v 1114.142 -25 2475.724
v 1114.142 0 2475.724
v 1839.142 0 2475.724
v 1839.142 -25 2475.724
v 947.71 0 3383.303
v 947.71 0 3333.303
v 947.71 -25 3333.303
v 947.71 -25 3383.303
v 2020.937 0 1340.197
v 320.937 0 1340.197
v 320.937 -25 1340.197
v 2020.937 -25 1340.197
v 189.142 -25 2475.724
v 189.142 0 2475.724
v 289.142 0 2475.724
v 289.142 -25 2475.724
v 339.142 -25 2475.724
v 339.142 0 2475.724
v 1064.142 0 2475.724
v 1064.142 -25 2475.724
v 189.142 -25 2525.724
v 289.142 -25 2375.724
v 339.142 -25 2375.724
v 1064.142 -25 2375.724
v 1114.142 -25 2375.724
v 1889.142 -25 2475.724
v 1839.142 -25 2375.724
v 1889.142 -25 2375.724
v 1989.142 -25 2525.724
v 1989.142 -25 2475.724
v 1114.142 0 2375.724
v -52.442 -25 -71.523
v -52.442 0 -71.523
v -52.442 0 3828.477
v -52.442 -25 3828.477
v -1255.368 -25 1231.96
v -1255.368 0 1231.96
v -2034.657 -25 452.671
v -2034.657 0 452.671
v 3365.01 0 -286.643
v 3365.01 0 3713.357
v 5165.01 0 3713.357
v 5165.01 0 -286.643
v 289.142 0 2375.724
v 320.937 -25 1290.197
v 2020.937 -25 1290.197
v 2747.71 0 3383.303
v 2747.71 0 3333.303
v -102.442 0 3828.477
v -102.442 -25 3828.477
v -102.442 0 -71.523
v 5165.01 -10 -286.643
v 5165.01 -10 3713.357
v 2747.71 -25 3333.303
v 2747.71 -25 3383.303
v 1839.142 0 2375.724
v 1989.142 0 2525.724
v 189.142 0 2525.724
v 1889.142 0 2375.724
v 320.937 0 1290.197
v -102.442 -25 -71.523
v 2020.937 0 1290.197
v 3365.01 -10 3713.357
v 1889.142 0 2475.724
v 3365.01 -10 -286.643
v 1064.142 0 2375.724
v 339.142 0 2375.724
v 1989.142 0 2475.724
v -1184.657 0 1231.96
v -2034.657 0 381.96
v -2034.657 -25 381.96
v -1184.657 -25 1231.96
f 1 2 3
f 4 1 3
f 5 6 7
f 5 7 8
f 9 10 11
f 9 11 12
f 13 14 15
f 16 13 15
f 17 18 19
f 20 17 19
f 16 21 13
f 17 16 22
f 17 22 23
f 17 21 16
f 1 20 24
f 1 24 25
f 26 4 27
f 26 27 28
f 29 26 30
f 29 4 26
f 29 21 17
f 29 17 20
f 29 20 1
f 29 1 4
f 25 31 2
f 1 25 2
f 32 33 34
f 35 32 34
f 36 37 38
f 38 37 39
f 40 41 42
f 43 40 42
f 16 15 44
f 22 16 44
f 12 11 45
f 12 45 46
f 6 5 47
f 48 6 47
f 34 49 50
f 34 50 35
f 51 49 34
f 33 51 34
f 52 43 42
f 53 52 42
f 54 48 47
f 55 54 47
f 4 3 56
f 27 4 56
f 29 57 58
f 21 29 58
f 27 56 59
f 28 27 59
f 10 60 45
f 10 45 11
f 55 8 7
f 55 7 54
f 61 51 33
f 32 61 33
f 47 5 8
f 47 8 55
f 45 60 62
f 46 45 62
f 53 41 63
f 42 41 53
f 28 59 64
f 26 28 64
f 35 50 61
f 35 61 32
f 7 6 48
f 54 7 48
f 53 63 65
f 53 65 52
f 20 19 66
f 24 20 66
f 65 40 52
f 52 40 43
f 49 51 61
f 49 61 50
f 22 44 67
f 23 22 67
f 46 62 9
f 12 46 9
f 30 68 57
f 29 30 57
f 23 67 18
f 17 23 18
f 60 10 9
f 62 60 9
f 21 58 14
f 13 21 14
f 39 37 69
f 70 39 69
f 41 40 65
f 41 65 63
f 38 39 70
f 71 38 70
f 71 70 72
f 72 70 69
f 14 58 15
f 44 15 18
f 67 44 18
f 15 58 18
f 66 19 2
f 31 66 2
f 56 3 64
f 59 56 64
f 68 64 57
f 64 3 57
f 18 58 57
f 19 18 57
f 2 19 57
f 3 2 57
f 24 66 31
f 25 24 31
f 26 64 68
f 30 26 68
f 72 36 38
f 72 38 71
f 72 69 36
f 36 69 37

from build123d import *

# Parameters (mm, degrees)
F0_W      = 50
F0_H      = 3900
F1_DEPTH  = 25
F2_W      = 1800
F2_H      = 50
F3_DEPTH  = 25
F5_DEPTH  = 25
F6_W      = 1700
F6_H      = 50
F7_DEPTH  = 25
F8_W      = 1800
F8_H      = 4000
F9_DEPTH  = 10
F11_DEPTH = 25


with BuildPart() as f1:
    # F0 (on Front) → F1 (new body)
    with BuildSketch(Plane.XZ):
        with Locations((-77.442256, 1878.476803)):
            Rectangle(F0_W, F0_H)
    extrude(amount=F1_DEPTH)


with BuildPart() as f3:
    # F2 (on Front) → F3 (new body)
    with BuildSketch(Plane.XZ):
        with Locations((1847.70999, 3358.303452)):
            Rectangle(F2_W, F2_H)
    extrude(amount=F3_DEPTH)


with BuildPart() as f5:
    # F4 (on Front) → F5 (new body)
    with BuildSketch(Plane.XZ):
        Polygon((1989.142323, 2525.724077), (189.142323, 2525.724077), (189.142323, 2475.724077), (289.142323, 2475.724077), (289.142323, 2375.724077), (339.142323, 2375.724077), (339.142323, 2475.724077), (1064.142323, 2475.724077), (1064.142323, 2375.724077), (1114.142323, 2375.724077), (1114.142323, 2475.724077), (1839.142323, 2475.724077), (1839.142323, 2375.724077), (1889.142323, 2375.724077), (1889.142323, 2475.724077), (1989.142323, 2475.724077), align=None)
    extrude(amount=F5_DEPTH)


with BuildPart() as f7:
    # F6 (on Front) → F7 (new body)
    with BuildSketch(Plane.XZ):
        with Locations((1170.937037, 1315.197134)):
            Rectangle(F6_W, F6_H)
    extrude(amount=F7_DEPTH)


with BuildPart() as f9:
    # F8 (on Front) → F9 (new body)
    with BuildSketch(Plane.XZ):
        with Locations((4265.009546, 1713.356882)):
            Rectangle(F8_W, F8_H)
    extrude(amount=F9_DEPTH)


with BuildPart() as f11:
    # F10 (on Front) → F11 (new body)
    with BuildSketch(Plane.XZ):
        Polygon((-2034.65724, 381.959915), (-1184.65724, 1231.959915), (-1255.367918, 1231.959915), (-2034.65724, 452.670593), align=None)
    extrude(amount=F11_DEPTH)


solid = Compound([f1.part, f3.part, f5.part, f7.part, f9.part, f11.part])
